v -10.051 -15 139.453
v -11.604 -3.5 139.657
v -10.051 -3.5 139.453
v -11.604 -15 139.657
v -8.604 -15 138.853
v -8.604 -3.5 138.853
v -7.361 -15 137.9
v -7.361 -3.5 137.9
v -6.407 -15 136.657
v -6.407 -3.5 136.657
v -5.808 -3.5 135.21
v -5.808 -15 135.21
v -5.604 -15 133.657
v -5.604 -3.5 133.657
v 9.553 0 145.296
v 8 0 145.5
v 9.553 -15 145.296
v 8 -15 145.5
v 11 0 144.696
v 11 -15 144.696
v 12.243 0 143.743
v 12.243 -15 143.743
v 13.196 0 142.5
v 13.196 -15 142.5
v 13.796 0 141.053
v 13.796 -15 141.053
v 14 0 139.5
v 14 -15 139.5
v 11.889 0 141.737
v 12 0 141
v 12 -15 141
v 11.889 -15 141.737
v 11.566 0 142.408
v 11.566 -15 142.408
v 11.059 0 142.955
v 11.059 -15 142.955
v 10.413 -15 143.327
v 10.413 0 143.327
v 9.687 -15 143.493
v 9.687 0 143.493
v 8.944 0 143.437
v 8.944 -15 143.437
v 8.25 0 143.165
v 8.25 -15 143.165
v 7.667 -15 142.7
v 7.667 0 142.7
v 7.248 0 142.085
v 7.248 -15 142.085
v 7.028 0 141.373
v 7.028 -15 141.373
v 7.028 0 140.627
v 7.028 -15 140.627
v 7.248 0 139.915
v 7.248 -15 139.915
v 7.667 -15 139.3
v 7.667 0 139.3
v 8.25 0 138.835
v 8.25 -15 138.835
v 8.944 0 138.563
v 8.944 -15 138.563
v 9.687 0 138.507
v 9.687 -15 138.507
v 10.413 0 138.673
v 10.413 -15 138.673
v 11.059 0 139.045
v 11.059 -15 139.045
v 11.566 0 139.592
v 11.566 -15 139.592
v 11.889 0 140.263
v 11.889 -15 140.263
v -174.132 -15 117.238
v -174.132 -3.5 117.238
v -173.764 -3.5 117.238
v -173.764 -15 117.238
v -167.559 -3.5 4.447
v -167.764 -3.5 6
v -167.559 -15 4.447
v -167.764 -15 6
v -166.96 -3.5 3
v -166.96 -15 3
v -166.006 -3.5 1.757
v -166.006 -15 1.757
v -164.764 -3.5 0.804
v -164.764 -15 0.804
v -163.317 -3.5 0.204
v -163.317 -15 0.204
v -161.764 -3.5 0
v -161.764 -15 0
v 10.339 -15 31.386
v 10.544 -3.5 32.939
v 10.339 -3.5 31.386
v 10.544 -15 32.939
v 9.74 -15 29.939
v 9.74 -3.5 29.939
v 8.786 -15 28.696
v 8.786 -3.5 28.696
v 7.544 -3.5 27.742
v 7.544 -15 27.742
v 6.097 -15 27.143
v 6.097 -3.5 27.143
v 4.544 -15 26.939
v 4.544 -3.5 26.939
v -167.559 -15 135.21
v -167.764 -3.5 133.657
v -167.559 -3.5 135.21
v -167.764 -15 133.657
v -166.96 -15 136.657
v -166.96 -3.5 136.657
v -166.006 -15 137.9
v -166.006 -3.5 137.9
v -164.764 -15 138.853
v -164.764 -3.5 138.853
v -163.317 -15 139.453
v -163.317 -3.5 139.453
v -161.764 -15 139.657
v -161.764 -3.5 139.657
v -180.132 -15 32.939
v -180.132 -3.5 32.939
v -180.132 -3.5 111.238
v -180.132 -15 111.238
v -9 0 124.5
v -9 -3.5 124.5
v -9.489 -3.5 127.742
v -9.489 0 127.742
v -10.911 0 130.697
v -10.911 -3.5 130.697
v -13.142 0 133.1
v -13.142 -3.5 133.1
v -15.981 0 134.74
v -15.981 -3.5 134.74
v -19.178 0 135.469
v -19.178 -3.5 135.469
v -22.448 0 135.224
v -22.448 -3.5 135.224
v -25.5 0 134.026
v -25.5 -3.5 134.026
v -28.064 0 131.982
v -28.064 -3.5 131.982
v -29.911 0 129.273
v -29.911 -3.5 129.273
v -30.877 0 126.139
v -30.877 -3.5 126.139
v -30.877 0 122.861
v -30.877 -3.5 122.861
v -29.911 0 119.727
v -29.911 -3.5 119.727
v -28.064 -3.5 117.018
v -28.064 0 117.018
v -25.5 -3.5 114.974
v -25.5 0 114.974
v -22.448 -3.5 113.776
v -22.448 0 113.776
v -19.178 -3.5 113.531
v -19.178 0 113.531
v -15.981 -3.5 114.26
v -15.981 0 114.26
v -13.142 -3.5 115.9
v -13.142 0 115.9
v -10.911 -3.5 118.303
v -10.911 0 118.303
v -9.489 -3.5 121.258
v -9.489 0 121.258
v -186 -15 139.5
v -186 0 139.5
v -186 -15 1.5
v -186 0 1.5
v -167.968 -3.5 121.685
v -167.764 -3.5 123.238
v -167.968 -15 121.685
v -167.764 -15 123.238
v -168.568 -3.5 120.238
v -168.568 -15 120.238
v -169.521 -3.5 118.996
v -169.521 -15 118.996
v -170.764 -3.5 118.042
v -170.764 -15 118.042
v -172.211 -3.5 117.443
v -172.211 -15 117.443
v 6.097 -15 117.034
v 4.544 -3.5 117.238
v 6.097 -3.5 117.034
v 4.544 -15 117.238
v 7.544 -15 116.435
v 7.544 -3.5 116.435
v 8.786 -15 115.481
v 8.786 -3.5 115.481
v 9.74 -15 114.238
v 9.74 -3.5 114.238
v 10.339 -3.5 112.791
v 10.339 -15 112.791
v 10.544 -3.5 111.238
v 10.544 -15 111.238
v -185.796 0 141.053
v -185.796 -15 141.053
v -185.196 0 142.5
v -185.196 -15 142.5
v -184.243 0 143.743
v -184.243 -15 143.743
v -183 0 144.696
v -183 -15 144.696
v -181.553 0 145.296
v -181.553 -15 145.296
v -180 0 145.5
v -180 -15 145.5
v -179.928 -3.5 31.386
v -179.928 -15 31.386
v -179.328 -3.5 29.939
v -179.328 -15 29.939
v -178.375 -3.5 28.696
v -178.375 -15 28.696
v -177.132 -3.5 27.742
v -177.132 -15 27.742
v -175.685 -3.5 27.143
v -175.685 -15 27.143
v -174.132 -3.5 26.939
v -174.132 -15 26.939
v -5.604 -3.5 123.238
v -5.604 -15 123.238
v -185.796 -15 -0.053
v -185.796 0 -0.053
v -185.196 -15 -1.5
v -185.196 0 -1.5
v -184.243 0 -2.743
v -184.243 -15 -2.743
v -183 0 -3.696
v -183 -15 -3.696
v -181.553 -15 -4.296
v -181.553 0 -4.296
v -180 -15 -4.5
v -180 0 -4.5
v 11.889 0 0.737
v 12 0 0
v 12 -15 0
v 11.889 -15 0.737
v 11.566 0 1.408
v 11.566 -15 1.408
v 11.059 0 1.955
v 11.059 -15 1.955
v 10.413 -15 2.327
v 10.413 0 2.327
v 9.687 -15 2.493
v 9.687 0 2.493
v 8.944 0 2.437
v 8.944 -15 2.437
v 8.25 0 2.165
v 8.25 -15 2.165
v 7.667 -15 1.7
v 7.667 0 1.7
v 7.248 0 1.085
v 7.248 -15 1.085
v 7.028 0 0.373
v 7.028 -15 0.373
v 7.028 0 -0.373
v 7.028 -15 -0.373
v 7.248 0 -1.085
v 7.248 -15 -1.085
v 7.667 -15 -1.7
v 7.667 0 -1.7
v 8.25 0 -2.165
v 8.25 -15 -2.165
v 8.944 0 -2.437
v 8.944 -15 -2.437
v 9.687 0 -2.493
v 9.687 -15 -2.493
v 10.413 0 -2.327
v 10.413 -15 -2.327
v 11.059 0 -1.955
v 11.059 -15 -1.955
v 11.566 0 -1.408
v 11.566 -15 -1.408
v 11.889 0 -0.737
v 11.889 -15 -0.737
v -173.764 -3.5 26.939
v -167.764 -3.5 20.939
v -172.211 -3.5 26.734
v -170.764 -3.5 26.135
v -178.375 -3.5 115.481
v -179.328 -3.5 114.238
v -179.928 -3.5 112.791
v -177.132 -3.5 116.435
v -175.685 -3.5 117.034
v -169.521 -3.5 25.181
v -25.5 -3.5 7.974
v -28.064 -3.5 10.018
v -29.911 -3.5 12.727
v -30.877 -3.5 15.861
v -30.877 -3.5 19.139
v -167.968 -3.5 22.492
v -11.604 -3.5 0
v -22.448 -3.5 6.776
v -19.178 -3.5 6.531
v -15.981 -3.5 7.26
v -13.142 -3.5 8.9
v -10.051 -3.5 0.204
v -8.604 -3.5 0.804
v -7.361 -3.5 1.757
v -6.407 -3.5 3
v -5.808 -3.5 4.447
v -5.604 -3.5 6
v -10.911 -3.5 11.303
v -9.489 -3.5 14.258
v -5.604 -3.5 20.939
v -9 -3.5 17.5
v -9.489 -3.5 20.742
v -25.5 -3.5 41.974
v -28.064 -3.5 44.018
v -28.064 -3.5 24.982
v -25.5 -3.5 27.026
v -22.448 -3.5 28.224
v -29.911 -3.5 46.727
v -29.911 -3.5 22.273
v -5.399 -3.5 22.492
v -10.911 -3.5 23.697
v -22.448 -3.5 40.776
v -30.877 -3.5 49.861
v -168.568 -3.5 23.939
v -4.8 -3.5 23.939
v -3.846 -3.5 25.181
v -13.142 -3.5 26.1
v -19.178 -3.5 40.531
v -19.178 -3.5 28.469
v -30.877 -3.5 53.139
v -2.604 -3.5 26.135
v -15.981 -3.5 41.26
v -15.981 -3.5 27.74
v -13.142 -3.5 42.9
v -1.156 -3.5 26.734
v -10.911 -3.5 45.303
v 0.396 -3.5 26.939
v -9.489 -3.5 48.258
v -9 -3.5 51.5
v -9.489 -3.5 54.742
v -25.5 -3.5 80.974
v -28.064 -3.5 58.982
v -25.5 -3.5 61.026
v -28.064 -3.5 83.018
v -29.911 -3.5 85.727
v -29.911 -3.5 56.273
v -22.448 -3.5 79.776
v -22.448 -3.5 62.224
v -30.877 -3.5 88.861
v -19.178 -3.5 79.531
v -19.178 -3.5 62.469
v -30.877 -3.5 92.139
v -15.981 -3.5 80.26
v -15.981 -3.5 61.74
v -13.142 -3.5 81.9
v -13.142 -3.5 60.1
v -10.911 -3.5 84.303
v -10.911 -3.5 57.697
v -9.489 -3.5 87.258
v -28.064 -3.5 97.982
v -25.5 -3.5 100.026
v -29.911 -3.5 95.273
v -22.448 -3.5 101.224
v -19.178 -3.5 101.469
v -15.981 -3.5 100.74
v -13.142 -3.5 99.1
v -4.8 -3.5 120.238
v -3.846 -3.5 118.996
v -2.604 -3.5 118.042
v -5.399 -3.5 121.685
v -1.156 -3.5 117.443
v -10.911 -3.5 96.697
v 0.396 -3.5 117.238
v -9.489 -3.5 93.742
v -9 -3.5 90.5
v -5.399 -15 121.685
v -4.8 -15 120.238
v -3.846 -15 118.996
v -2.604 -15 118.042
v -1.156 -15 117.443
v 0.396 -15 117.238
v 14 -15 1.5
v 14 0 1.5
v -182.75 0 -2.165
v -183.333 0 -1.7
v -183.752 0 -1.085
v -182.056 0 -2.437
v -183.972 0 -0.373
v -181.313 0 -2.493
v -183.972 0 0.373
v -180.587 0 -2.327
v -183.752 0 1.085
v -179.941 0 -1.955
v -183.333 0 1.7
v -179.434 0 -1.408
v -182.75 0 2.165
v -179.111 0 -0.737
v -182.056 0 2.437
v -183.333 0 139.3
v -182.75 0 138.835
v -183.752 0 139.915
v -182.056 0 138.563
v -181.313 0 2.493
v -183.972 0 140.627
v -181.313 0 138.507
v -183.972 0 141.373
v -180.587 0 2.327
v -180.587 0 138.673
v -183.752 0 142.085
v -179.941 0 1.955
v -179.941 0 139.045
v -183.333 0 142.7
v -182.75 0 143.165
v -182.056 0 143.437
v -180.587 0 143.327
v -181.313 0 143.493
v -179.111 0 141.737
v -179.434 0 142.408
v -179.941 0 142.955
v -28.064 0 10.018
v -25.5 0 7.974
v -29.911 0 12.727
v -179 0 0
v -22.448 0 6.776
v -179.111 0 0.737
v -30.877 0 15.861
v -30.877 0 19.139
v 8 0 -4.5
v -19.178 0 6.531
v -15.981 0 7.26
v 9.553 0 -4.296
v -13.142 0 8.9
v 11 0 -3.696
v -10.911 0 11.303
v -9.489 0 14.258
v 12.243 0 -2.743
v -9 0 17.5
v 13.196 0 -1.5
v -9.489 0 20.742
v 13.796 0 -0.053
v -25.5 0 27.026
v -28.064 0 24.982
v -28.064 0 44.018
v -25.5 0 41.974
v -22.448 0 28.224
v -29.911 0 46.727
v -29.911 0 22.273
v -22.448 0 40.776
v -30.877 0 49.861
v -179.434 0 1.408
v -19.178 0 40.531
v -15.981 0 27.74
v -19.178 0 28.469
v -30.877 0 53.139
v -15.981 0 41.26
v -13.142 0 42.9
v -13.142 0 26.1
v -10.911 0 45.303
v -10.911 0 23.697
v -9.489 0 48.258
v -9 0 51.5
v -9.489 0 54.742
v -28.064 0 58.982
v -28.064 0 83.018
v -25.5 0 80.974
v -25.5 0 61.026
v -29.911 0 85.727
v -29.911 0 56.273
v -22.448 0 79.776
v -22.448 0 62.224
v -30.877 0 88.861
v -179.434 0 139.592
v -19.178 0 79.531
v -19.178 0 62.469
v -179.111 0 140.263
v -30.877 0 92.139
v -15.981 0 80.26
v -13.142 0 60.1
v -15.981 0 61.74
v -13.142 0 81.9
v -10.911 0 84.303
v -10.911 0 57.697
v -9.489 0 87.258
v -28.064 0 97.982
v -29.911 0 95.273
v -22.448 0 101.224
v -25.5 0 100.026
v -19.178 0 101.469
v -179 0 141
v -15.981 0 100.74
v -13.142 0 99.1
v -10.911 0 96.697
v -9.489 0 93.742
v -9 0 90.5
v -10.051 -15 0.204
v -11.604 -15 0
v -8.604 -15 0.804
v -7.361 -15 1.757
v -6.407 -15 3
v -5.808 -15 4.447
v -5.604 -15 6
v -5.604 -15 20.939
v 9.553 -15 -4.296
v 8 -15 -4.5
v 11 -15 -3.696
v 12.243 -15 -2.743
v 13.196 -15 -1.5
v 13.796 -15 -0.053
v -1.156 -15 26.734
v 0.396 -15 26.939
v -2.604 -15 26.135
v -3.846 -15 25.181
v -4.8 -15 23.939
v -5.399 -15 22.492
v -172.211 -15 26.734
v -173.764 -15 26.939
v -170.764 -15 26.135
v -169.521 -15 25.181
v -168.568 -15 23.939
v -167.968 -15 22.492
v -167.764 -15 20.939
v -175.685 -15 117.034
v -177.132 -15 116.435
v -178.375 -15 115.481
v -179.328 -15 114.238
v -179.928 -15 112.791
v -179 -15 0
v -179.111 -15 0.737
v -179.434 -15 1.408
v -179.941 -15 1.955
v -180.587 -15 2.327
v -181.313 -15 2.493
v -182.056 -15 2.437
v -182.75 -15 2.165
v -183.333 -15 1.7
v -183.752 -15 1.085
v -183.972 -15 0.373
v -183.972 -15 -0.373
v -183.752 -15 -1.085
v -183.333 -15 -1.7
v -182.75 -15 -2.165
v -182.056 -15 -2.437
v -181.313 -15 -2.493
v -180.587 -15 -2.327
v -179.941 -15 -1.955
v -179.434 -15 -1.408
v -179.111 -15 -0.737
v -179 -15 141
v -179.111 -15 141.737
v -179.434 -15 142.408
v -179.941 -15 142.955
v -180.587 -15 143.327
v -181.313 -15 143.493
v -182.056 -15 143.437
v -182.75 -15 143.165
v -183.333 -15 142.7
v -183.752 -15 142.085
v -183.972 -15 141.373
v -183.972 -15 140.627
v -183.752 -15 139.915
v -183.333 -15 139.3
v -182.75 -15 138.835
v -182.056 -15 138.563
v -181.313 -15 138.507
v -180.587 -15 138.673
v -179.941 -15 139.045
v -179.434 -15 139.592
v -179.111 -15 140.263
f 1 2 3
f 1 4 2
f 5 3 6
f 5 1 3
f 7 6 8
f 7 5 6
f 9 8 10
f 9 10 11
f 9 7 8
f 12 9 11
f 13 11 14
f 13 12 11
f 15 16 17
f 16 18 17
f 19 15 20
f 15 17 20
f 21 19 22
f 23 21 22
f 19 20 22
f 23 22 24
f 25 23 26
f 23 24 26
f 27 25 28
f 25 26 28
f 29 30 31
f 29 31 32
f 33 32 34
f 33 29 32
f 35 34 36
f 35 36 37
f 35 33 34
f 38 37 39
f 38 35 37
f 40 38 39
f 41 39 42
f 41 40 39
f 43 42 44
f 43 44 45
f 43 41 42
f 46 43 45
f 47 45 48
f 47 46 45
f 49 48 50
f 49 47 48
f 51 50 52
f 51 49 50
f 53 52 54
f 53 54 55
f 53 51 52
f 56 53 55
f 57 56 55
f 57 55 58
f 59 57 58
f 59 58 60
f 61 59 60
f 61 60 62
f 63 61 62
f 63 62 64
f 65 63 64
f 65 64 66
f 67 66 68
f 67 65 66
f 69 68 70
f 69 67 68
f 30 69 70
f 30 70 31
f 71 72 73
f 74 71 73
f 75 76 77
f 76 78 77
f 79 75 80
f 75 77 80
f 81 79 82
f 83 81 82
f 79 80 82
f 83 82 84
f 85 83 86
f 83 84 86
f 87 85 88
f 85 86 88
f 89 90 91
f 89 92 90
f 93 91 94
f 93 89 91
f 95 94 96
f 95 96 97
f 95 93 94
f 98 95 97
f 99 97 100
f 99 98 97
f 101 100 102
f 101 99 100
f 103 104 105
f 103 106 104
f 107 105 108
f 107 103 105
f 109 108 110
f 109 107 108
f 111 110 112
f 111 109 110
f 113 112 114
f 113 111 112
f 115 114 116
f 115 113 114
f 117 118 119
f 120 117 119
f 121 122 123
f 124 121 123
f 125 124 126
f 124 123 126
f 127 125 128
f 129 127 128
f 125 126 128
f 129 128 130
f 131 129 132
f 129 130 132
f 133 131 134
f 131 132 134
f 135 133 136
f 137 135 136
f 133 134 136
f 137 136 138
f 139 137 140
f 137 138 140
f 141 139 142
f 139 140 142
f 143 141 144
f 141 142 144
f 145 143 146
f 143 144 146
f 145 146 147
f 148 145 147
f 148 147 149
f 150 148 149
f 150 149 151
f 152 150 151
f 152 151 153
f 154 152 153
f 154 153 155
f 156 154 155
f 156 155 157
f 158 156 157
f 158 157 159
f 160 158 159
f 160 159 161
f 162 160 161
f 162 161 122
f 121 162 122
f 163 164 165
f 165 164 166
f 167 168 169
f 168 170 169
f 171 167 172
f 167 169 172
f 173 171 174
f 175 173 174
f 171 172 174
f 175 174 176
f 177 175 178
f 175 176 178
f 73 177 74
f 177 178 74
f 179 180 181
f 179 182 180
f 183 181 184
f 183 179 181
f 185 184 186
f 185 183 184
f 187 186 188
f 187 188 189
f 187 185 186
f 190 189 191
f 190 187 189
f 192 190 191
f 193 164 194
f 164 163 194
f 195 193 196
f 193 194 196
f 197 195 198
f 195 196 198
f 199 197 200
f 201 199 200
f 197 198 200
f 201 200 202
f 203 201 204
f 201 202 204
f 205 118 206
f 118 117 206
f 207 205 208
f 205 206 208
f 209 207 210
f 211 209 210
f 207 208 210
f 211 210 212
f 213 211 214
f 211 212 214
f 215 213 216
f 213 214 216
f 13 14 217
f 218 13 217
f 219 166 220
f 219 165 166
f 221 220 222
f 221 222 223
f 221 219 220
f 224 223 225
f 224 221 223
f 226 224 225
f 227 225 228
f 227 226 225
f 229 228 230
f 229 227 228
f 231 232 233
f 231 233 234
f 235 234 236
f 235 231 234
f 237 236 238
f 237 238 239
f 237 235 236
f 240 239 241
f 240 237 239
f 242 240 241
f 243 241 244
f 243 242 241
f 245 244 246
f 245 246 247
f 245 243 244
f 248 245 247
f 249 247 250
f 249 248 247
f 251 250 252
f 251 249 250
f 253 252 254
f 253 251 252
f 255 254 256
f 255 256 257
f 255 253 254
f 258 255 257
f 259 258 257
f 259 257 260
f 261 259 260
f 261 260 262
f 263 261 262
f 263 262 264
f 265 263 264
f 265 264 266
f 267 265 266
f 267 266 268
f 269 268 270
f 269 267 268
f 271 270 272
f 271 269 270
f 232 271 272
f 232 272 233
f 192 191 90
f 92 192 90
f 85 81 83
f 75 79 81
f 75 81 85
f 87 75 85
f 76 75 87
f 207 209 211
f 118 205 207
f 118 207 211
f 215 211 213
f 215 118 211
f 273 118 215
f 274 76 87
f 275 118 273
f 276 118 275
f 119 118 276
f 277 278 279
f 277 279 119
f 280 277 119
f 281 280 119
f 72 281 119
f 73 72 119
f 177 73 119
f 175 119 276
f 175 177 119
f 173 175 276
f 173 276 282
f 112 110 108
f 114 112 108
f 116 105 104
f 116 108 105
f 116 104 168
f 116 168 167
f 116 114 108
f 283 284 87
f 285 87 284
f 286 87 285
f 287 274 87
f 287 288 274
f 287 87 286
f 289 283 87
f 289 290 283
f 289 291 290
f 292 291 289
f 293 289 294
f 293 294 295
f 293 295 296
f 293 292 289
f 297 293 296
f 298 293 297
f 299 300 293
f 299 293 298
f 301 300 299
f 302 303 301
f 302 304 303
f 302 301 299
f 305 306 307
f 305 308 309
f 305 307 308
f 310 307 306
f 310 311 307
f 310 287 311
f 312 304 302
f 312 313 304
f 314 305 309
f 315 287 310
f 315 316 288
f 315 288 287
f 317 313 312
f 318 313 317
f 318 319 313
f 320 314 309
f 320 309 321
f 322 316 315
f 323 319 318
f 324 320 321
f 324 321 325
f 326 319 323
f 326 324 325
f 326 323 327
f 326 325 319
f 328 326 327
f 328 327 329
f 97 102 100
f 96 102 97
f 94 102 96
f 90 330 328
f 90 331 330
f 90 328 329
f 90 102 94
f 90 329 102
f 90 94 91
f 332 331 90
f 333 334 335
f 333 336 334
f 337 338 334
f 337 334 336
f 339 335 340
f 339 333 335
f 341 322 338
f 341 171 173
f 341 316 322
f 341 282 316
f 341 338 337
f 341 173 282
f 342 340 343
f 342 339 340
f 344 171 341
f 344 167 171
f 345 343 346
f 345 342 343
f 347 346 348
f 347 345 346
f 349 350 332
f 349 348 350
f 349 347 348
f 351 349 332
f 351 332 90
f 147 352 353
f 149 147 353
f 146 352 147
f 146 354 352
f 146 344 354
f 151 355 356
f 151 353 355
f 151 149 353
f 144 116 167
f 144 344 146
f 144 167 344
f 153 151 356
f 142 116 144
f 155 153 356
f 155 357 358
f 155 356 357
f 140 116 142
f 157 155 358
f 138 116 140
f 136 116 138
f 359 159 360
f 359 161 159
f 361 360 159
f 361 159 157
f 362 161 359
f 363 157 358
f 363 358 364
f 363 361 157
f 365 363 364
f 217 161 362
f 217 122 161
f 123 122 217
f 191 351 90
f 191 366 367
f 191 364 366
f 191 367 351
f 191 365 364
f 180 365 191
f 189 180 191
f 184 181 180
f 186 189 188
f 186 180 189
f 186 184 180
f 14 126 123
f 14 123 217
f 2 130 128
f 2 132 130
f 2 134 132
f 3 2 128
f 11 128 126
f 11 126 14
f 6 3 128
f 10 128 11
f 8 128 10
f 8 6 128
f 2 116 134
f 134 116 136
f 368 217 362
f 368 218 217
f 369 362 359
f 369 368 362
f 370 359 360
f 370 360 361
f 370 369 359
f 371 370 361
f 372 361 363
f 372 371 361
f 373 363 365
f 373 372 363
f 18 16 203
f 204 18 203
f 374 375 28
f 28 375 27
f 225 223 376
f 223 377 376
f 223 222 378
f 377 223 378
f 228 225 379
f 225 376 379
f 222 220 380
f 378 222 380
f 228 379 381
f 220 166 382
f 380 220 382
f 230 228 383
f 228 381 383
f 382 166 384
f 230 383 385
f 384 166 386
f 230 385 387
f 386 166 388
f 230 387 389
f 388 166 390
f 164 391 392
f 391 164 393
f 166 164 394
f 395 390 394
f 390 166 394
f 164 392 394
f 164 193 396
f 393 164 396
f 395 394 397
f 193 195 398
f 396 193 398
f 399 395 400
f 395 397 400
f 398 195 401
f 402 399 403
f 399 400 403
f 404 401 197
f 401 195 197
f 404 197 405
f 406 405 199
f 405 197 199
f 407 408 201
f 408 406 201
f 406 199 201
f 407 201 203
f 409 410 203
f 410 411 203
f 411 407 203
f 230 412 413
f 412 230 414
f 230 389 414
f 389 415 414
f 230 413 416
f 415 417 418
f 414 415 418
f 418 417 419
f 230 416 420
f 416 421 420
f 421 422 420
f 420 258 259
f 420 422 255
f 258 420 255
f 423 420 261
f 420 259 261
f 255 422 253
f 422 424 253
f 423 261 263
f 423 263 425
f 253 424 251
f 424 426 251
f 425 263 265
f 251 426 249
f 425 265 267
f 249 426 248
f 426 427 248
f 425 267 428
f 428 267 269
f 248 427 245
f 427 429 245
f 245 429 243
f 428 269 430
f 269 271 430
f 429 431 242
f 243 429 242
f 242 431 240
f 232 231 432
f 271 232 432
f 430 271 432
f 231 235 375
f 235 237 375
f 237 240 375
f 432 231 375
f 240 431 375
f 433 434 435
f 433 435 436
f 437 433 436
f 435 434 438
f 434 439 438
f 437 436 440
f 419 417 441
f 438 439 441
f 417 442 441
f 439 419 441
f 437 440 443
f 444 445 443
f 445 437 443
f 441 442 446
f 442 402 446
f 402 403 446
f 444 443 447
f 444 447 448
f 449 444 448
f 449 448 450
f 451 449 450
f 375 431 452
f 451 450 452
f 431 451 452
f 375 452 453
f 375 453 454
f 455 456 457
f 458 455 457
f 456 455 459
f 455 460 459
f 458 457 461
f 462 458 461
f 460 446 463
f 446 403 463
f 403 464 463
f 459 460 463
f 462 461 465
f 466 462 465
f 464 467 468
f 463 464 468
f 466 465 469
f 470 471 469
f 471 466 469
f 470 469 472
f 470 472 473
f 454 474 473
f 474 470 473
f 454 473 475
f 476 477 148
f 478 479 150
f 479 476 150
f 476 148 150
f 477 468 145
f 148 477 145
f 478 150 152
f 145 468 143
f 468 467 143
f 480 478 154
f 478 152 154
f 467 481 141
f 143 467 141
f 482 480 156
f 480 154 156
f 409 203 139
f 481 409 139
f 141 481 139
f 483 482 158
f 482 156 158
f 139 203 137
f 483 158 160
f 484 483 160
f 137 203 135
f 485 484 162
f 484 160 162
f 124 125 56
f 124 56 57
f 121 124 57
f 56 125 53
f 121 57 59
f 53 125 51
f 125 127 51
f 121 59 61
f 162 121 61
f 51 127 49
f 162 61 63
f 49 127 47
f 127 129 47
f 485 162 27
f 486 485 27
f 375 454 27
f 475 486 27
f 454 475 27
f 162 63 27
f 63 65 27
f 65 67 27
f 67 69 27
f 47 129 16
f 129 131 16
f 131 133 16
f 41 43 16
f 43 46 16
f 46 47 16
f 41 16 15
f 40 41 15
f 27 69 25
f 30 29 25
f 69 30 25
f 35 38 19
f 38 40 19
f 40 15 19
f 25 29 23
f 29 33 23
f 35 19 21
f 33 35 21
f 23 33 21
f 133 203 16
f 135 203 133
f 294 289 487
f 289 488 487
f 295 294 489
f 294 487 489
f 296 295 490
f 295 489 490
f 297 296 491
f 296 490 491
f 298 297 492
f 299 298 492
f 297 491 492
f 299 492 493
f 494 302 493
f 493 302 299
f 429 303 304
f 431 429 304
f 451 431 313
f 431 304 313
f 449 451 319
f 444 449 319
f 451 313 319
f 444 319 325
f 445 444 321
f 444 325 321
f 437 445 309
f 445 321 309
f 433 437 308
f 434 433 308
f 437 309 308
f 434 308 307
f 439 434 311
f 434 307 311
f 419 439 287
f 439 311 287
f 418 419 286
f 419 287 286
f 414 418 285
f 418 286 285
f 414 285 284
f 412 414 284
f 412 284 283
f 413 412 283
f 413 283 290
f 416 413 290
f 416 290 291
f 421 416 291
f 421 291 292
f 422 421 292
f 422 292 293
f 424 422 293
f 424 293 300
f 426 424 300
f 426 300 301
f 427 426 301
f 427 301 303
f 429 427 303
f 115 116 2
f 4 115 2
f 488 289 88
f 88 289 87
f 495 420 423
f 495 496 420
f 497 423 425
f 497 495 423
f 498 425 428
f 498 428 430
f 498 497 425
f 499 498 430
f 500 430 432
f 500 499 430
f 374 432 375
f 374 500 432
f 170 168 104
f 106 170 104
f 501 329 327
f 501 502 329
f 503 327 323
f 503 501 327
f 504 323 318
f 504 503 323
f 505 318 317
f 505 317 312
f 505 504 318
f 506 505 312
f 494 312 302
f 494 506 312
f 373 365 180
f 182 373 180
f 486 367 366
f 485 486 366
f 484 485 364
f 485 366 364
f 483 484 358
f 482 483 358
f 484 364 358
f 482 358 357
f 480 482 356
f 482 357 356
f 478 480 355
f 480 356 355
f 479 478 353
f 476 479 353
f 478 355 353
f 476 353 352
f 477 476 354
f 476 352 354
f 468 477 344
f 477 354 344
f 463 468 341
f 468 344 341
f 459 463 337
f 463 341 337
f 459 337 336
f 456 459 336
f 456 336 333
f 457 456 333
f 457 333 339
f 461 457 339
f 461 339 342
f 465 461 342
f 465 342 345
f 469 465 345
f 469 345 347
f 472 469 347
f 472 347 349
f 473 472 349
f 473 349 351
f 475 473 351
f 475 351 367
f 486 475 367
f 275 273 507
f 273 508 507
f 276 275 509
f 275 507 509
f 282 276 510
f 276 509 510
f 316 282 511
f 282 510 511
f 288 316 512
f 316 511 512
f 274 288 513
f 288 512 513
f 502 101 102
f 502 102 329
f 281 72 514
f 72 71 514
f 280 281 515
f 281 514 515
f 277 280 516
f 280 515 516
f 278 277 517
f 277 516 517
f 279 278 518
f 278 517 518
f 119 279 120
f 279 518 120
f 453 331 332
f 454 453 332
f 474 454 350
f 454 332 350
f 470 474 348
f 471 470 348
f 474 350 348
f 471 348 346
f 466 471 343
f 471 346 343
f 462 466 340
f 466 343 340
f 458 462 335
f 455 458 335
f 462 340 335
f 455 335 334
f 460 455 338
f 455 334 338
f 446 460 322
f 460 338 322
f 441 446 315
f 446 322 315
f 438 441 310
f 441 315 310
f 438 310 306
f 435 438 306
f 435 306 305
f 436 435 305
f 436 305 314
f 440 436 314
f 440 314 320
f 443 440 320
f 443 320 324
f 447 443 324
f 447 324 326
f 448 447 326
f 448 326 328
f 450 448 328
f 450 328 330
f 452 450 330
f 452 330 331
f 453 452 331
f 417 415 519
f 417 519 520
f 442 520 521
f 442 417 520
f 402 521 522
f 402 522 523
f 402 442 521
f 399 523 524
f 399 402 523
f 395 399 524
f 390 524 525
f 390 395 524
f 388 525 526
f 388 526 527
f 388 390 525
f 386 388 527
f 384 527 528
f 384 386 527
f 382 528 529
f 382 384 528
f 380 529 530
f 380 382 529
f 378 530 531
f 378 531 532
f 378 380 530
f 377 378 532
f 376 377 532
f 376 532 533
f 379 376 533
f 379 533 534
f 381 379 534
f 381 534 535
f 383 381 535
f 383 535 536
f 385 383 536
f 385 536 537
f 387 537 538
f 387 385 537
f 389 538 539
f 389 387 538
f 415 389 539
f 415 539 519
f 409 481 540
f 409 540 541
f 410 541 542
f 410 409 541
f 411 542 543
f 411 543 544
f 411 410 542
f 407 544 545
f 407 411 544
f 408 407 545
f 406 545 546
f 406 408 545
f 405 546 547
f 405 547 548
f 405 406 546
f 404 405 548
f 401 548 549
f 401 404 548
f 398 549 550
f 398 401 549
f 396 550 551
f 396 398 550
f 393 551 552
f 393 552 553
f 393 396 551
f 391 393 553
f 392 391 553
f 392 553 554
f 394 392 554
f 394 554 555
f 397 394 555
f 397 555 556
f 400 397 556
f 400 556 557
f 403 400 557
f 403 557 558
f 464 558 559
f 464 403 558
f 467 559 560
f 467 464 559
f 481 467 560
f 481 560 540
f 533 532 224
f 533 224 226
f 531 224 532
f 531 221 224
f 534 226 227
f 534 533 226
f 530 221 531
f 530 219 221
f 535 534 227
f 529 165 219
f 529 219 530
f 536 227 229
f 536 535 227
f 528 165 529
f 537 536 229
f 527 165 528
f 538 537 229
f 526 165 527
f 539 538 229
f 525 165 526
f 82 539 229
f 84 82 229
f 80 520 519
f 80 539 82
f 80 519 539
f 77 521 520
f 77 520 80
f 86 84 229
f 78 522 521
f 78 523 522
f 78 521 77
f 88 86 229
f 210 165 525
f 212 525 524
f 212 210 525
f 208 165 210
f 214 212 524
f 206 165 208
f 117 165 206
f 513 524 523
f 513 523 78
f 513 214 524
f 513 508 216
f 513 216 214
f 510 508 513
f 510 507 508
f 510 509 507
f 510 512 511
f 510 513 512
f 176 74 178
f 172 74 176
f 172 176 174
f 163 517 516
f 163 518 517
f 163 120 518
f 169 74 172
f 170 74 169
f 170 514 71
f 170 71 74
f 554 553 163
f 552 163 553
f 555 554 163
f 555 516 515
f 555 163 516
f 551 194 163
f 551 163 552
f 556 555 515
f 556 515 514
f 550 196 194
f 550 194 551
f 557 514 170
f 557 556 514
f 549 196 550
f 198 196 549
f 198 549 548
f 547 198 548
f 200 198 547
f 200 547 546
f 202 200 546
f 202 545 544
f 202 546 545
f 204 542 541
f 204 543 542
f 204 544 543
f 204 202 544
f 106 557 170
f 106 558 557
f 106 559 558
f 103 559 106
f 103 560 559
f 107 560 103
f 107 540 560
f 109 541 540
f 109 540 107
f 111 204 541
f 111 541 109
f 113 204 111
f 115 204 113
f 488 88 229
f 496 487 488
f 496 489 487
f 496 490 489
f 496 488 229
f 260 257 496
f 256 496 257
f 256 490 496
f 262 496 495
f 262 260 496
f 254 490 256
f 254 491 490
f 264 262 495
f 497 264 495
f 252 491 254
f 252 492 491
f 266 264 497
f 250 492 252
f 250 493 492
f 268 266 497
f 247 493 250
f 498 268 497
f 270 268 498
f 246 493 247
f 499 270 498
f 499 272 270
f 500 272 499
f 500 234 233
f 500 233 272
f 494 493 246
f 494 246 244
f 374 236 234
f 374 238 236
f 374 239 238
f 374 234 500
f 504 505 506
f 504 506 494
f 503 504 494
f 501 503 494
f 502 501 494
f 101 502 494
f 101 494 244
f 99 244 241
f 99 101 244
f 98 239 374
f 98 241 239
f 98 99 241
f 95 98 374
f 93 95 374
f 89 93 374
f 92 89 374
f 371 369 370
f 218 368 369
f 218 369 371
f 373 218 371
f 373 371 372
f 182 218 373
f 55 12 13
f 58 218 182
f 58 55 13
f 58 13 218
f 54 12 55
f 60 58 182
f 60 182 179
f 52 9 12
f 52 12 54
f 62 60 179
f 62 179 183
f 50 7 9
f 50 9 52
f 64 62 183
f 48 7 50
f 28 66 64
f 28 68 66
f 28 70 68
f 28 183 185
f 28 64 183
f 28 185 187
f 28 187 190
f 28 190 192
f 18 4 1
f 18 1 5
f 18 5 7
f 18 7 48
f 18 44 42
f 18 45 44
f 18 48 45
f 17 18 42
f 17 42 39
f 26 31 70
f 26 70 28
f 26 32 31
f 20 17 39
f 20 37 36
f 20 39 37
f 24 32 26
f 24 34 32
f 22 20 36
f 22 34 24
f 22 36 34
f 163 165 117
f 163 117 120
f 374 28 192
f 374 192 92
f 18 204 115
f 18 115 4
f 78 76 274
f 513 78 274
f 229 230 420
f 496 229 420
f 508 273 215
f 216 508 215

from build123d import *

# Parameters (mm, degrees)
F0_W     = 14
F0_H     = 23.5
F0_R     = 2.5
F1_DEPTH = 15
F2_DEPTH = 3.5
F3_R     = 6
F4_R     = 11
F5_DEPTH = 25


with BuildPart() as f1:
    # F0 (on Front) → F1 (new body)
    with BuildSketch(Plane.XZ):
        with Locations((-179, 133.75)):
            Rectangle(F0_W, F0_H)
        with Locations((-181.5, 141)):
            Circle(F0_R, mode=Mode.SUBTRACT)
        Polygon((0, 145.5), (-172, 145.5), (-172, 122), (-186, 122), (-186, 19), (-172, 19), (-172, -4.5), (0, -4.5), (0, 19), (14, 19), (14, 122), (0, 122), align=None)
        Polygon((-167.763814, 139.657289), (-5.603518, 139.657289), (-5.603518, 117.238402), (10.543795, 117.238402), (10.543795, 26.938597), (-5.603518, 26.938597), (-5.603518, 0), (-167.763814, 0), (-167.763814, 26.938597), (-180.131972, 26.938597), (-180.131972, 117.238402), (-167.763814, 117.238402), align=None, mode=Mode.SUBTRACT)
        with Locations((7, 133.75)):
            Rectangle(F0_W, F0_H)
        with Locations((9.5, 141)):
            Circle(F0_R, mode=Mode.SUBTRACT)
        with Locations((-179, 7.25)):
            Rectangle(F0_W, F0_H)
        with Locations((-181.5, 0)):
            Circle(F0_R, mode=Mode.SUBTRACT)
        with Locations((7, 7.25)):
            Rectangle(F0_W, F0_H)
        with Locations((9.5, 0)):
            Circle(F0_R, mode=Mode.SUBTRACT)
    extrude(amount=F1_DEPTH)

    # F0 (on Front) → F2 (join)
    with BuildSketch(Plane.XZ):
        Polygon((-5.603518, 117.238402), (-5.603518, 139.657289), (-167.763814, 139.657289), (-167.763814, 117.238402), (-180.131972, 117.238402), (-180.131972, 26.938597), (-167.763814, 26.938597), (-167.763814, 0), (-5.603518, 0), (-5.603518, 26.938597), (10.543795, 26.938597), (10.543795, 117.238402), align=None)
    extrude(amount=F2_DEPTH)

    # F3
    f3_edges = [f1.edges().sort_by_distance(p)[0] for p in [
        (-186, -7.5, 145.5),
        (-186, -7.5, -4.5),
        (14, -7.5, -4.5),
        (14, -7.5, 145.5),
        (-180.131972, -9.25, 26.938597),
        (-167.763814, -9.25, 26.938597),
        (-167.763814, -9.25, 0),
        (-5.603518, -9.25, 0),
        (-5.603518, -9.25, 26.938597),
        (10.543795, -9.25, 26.938597),
        (-180.131972, -9.25, 117.238402),
        (-167.763814, -9.25, 117.238402),
        (-167.763814, -9.25, 139.657289),
        (10.543795, -9.25, 117.238402),
        (-5.603518, -9.25, 117.238402),
        (-5.603518, -9.25, 139.657289),
    ]]
    fillet(f3_edges, radius=F3_R)

    # F4 (on face) → F5 (cut)
    with BuildSketch(Plane.XZ.offset(3.5)):
        with Locations((-20, 124.5)):
            Circle(F4_R)
        with Locations((-20, 90.5)):
            Circle(F4_R)
        with Locations((-20, 51.5)):
            Circle(F4_R)
        with Locations((-20, 17.5)):
            Circle(F4_R)
    extrude(amount=-F5_DEPTH, mode=Mode.SUBTRACT)


solid = f1.part
